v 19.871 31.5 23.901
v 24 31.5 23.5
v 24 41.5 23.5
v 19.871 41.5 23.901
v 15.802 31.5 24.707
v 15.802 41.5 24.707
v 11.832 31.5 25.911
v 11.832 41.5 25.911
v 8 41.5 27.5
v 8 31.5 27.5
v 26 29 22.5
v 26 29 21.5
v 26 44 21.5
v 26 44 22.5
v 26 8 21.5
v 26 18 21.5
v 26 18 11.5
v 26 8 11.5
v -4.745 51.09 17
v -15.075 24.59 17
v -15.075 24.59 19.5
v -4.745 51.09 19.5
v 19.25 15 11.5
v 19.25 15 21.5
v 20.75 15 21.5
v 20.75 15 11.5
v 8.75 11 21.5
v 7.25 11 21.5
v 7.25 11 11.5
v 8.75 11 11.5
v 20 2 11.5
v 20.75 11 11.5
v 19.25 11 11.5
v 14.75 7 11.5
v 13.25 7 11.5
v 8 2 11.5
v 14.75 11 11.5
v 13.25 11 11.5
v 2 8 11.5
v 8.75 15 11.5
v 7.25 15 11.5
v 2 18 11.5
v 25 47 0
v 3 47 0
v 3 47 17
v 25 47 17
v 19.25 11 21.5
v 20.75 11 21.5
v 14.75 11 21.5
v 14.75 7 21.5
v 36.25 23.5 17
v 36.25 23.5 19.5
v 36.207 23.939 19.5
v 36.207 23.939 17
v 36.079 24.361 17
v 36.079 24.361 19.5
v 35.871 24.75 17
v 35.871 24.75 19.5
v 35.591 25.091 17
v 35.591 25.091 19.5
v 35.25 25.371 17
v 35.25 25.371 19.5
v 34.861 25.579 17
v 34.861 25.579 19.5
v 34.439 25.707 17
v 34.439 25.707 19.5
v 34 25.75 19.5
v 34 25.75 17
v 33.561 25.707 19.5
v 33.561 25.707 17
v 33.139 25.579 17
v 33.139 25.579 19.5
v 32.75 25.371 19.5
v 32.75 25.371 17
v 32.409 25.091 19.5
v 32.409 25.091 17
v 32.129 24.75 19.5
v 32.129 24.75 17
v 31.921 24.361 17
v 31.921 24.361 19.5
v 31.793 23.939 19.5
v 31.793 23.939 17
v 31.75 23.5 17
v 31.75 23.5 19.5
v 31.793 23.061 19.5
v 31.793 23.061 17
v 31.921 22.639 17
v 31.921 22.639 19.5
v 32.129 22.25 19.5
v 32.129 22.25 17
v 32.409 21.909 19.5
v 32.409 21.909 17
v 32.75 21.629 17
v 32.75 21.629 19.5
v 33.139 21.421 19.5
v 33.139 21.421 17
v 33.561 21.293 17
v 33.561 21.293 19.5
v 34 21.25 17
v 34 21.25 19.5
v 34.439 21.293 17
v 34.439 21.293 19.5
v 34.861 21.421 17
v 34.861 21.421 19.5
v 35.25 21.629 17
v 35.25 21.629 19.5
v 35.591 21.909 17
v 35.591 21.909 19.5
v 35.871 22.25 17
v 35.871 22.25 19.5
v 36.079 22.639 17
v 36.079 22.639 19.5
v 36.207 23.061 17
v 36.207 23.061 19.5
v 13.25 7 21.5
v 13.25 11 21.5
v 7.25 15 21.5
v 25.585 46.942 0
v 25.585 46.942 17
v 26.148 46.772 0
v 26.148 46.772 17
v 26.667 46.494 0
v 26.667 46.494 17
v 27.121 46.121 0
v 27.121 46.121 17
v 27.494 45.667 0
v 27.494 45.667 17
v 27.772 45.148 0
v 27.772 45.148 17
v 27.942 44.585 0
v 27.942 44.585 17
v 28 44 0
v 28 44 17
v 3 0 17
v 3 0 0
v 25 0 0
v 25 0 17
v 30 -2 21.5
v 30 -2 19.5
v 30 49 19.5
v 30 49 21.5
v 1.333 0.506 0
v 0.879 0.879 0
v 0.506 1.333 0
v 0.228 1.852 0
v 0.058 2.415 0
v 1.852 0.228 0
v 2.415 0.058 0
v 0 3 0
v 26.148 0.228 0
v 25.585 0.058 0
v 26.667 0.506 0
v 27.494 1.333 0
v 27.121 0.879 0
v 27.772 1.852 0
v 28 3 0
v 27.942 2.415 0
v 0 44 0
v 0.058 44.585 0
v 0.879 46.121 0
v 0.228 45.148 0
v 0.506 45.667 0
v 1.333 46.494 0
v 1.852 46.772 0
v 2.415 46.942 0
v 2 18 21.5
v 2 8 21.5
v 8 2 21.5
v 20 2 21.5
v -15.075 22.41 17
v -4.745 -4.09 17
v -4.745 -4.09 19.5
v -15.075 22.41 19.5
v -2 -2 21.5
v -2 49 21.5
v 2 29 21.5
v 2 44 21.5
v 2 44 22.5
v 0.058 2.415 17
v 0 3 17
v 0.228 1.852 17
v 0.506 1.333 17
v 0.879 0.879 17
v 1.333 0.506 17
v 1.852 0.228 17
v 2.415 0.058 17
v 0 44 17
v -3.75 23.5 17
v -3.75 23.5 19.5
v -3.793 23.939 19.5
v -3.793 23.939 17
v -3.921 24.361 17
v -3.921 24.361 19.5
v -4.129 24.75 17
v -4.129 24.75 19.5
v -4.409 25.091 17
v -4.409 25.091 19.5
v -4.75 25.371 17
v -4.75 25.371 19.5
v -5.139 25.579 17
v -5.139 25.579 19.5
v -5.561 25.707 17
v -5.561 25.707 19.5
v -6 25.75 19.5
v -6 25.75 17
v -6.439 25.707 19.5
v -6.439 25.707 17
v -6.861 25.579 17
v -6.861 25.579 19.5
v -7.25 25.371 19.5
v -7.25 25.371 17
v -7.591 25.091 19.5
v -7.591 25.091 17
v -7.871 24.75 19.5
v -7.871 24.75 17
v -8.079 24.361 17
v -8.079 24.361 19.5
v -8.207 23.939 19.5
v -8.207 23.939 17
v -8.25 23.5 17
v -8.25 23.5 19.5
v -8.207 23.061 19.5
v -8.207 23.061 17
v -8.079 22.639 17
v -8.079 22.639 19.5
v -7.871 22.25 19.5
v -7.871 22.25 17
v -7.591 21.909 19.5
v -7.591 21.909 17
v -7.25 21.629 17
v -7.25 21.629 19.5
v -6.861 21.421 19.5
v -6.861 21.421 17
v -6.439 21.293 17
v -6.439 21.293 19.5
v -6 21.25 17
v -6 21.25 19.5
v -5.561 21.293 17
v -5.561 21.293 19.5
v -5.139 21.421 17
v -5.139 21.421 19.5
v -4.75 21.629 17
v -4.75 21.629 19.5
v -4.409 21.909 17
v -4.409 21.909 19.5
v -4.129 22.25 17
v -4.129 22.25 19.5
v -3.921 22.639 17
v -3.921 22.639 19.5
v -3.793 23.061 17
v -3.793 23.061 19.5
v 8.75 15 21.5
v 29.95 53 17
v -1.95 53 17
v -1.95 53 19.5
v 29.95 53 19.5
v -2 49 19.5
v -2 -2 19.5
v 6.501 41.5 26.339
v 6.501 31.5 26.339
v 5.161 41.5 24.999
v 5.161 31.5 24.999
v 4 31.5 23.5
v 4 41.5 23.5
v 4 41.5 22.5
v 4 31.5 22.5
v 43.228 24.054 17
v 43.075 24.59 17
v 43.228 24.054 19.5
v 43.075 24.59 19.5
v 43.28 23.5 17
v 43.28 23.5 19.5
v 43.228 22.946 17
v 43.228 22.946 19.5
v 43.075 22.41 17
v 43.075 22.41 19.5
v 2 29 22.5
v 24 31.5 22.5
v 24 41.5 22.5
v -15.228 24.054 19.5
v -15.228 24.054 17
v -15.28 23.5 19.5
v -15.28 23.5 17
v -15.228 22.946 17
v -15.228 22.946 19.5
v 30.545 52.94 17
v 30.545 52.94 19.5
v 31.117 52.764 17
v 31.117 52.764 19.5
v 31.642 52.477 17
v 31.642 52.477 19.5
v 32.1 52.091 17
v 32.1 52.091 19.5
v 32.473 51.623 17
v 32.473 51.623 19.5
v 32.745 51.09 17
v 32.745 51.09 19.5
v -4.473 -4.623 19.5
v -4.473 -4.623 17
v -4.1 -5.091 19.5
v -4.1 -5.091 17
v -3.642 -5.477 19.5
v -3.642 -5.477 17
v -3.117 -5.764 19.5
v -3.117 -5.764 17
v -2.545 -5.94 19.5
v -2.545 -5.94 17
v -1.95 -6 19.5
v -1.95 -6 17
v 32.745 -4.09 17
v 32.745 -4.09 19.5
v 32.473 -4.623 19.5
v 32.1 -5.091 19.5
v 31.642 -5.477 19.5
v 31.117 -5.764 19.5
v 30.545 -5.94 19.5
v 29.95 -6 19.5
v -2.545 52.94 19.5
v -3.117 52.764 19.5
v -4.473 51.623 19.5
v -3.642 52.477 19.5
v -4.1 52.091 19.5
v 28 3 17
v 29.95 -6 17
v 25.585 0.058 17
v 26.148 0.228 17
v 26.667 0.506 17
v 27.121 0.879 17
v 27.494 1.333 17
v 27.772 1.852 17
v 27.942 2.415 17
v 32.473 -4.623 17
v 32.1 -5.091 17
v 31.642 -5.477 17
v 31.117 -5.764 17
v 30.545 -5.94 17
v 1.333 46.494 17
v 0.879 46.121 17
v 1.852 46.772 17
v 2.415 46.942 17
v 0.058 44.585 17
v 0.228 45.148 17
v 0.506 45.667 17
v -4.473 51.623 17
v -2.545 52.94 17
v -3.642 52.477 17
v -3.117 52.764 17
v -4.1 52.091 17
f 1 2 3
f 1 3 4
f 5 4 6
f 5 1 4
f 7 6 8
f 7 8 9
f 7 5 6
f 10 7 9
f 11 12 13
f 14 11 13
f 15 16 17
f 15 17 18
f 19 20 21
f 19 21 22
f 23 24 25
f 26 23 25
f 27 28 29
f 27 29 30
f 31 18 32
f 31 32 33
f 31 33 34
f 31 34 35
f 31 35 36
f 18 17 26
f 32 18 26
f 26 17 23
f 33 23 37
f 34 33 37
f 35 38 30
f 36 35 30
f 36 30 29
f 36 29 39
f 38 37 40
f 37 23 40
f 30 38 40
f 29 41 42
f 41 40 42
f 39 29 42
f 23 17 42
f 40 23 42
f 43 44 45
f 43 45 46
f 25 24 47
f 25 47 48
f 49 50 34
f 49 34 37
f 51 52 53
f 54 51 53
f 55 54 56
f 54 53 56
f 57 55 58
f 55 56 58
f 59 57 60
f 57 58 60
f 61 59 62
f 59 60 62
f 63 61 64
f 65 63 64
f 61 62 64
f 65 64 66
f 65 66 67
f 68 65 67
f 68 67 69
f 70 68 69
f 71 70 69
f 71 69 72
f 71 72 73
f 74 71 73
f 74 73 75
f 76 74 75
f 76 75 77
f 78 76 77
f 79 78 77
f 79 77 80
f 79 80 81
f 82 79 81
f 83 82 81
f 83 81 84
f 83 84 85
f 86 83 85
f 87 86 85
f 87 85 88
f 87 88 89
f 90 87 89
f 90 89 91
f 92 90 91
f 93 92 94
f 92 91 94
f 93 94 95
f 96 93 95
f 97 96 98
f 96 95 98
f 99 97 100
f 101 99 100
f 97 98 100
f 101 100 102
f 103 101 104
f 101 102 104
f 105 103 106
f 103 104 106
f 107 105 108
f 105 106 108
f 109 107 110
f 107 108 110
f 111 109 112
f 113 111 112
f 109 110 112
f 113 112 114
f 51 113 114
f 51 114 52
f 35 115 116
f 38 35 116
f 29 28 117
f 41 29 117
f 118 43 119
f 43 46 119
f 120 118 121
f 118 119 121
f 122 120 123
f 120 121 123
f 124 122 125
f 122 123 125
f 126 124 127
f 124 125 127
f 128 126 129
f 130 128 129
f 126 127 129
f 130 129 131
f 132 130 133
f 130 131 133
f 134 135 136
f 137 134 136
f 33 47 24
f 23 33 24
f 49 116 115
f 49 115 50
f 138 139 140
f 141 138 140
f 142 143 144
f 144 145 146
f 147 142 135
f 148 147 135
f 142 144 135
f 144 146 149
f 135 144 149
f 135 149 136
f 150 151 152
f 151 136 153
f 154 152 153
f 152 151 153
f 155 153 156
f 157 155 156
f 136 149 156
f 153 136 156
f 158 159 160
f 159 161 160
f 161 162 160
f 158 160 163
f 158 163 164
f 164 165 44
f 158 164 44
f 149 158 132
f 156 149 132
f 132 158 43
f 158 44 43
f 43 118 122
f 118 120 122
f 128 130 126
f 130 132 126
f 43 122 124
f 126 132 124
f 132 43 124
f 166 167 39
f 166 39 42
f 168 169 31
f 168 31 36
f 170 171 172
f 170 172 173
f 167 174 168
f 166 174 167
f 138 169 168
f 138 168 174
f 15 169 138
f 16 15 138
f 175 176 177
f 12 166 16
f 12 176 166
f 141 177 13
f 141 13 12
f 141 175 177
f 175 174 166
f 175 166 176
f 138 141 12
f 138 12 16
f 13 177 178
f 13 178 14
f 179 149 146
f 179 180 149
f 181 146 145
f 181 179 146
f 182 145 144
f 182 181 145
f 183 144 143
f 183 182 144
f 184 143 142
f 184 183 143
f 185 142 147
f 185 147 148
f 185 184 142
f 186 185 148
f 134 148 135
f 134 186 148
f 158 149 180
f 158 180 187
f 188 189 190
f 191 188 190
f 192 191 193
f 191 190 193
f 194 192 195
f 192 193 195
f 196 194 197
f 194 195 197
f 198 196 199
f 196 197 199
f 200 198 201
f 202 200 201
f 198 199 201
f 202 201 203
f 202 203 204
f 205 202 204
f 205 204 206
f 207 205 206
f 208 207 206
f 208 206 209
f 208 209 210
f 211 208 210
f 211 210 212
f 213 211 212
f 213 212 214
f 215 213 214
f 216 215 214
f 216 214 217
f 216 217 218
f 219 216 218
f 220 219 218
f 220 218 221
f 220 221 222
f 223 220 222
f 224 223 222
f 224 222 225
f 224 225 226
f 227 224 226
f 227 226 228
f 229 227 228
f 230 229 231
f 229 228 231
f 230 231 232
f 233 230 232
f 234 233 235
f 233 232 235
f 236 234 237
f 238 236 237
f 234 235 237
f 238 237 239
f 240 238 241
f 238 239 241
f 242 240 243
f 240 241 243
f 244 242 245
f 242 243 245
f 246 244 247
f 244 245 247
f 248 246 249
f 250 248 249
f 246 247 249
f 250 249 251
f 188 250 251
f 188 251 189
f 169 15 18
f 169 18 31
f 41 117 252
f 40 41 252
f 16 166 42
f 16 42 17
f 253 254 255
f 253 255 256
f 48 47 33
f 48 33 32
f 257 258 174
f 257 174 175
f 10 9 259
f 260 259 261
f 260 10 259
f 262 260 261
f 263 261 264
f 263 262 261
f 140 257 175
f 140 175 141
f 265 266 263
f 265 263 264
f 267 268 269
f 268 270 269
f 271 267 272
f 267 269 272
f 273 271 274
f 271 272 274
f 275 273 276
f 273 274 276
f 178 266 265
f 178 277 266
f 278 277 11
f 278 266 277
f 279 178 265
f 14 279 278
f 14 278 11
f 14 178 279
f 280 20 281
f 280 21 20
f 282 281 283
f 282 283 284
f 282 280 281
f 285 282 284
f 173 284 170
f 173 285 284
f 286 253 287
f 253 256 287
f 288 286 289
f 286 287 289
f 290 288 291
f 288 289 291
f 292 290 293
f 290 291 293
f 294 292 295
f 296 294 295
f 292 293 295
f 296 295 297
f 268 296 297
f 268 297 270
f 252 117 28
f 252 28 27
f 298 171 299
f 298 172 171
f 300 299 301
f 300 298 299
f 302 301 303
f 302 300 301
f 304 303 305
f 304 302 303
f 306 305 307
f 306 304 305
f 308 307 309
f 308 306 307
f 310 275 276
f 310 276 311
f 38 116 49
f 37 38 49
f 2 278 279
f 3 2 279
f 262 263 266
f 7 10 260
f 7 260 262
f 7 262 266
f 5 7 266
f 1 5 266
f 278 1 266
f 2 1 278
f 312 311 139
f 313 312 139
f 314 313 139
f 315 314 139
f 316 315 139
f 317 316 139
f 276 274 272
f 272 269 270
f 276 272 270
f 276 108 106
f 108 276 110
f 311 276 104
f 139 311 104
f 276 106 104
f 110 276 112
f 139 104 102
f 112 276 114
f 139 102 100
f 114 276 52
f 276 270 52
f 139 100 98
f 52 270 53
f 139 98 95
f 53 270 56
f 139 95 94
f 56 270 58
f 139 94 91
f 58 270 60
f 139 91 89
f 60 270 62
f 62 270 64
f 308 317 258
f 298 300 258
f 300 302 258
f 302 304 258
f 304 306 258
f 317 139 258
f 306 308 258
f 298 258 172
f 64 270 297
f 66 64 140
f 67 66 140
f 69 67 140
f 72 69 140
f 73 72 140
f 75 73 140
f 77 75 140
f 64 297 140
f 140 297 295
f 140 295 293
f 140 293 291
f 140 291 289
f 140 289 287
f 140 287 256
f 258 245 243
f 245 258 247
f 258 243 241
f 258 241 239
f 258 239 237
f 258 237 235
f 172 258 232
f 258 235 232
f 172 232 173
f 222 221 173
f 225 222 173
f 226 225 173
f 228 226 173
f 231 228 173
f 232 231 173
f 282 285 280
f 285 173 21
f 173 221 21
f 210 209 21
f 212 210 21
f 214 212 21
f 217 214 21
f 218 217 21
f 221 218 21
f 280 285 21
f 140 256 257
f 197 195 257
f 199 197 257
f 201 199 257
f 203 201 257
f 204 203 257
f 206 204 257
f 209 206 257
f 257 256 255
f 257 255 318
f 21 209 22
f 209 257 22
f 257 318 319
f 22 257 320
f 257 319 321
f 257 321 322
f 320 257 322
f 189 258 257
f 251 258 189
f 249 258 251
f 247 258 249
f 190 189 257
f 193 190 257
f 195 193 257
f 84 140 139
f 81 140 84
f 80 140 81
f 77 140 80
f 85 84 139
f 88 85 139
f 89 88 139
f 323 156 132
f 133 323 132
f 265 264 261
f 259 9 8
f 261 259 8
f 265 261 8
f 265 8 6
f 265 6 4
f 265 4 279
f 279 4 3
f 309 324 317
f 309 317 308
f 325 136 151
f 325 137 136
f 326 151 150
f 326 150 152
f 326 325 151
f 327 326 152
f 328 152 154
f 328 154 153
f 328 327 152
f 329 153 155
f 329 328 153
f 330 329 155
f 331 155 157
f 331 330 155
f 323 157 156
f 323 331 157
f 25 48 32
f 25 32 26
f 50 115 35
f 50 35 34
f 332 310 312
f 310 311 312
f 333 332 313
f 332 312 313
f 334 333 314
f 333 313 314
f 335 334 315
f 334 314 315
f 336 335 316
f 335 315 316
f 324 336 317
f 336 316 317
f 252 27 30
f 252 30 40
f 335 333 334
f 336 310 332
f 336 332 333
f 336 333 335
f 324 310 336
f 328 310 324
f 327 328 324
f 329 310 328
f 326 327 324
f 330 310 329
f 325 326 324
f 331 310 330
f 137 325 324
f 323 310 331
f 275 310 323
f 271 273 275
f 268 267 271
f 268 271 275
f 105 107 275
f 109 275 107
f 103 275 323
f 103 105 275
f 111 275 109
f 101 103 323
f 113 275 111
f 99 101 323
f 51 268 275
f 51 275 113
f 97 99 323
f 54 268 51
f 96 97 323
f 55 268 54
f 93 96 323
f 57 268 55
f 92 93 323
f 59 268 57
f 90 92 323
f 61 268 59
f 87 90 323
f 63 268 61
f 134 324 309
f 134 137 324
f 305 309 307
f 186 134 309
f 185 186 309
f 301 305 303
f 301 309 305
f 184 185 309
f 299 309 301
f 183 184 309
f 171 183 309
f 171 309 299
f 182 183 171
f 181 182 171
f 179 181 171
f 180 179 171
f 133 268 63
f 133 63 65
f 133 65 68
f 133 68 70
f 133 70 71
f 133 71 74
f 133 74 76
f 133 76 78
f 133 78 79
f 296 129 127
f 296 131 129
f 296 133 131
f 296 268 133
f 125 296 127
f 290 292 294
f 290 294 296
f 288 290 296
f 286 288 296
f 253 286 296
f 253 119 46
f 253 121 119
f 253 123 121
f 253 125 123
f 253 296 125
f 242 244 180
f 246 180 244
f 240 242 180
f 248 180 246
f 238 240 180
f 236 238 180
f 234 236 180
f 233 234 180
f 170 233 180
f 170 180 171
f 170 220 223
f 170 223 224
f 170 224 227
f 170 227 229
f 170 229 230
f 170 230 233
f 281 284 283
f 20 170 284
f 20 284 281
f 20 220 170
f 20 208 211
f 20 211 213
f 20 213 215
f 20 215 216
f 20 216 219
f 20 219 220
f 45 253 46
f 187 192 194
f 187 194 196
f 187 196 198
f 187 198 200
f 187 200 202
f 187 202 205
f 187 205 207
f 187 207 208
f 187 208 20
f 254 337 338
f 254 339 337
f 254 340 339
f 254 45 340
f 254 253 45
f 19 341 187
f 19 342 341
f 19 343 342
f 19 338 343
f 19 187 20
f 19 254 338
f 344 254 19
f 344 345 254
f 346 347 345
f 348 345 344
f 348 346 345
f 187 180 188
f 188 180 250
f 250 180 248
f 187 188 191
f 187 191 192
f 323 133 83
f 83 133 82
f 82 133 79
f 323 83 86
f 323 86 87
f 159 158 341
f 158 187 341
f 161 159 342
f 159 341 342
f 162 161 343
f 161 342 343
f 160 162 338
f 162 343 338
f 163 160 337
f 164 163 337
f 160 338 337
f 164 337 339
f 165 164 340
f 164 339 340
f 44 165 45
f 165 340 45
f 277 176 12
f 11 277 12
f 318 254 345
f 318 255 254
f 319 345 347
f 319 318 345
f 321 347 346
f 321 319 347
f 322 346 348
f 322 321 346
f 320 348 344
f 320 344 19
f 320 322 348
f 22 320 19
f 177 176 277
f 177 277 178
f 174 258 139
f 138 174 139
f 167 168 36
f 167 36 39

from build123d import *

# Parameters (mm, degrees)
SKETCH_1_W          = 28
SKETCH_1_H          = 47
EXTRUDE_1_DEPTH     = 17
EXTRUDE_2_DEPTH     = 2.5
SKETCH_3_W          = 32
SKETCH_3_H          = 51
EXTRUDE_3_DEPTH     = 2
SKETCH_5_W          = 1.5
SKETCH_5_H          = 4
CUT_EXTRUDE_3_DEPTH = 10
SKETCH_6_W          = 24
SKETCH_6_H          = 15
EXTRUDE_4_DEPTH     = 1
SKETCH_7_W          = 20
SKETCH_7_H          = 10
EXTRUDE_5_DEPTH     = 1
EXTRUDE_6_DEPTH     = 10
SKETCH_9_R          = 2.25
CUT_EXTRUDE_4_DEPTH = 20.5
FILLET_1_R          = 3


with BuildPart() as part:
    # Эскиз1 → Бобышка-Вытянуть1 (new body)
    with BuildSketch(Plane.XY):
        with Locations((14, 23.5)):
            Rectangle(SKETCH_1_W, SKETCH_1_H)
    extrude(amount=EXTRUDE_1_DEPTH)

    # Эскиз2 → Бобышка-Вытянуть2 (add)
    with BuildSketch(Plane.XY.offset(17)):
        Polygon((-4, 53), (32, 53), (43.5, 23.5), (32, -6), (-4, -6), (-15.5, 23.5), align=None)
    extrude(amount=EXTRUDE_2_DEPTH)

    # Эскиз3 → Бобышка-Вытянуть3 (add)
    with BuildSketch(Plane.XY.offset(19.5)):
        with Locations((14, 23.5)):
            Rectangle(SKETCH_3_W, SKETCH_3_H)
    extrude(amount=EXTRUDE_3_DEPTH)

    # Эскиз5 → Вырез-Вытянуть3 (cut)
    with BuildSketch(Plane.XY.offset(21.5)):
        Polygon((2, 18), (26, 18), (26, 8), (20, 2), (8, 2), (2, 8), align=None)
        with Locations((8, 13)):
            Rectangle(SKETCH_5_W, SKETCH_5_H, mode=Mode.SUBTRACT)
        with Locations((14, 9)):
            Rectangle(SKETCH_5_W, SKETCH_5_H, mode=Mode.SUBTRACT)
        with Locations((20, 13)):
            Rectangle(SKETCH_5_W, SKETCH_5_H, mode=Mode.SUBTRACT)
    extrude(amount=-CUT_EXTRUDE_3_DEPTH, mode=Mode.SUBTRACT)

    # Эскиз6 → Бобышка-Вытянуть4 (add)
    with BuildSketch(Plane.XY.offset(21.5)):
        with Locations((14, 36.5)):
            Rectangle(SKETCH_6_W, SKETCH_6_H)
    extrude(amount=EXTRUDE_4_DEPTH)

    # Эскиз7 → Бобышка-Вытянуть5 (add)
    with BuildSketch(Plane.XY.offset(22.5)):
        with Locations((14, 36.5)):
            Rectangle(SKETCH_7_W, SKETCH_7_H)
    extrude(amount=EXTRUDE_5_DEPTH)

    # Эскиз8 → Бобышка-Вытянуть6 (add)
    with BuildSketch(Plane.XZ.offset(-31.5)):
        with BuildLine():
            Line((4, 23.5), (24, 23.5))
            ThreePointArc((24, 23.5), (15.801732114, 24.706928456), (8, 27.5))
            ThreePointArc((8, 27.5), (5.80973161, 25.69026839), (4, 23.5))
        make_face()
    extrude(amount=-EXTRUDE_6_DEPTH)

    # Эскиз9 → Вырез-Вытянуть4 (cut, through all)
    with BuildSketch(Plane.XY.offset(19.5)):
        with Locations((-6, 23.5)):
            Circle(SKETCH_9_R)
        with Locations((34, 23.5)):
            Circle(SKETCH_9_R)
    extrude(amount=-CUT_EXTRUDE_4_DEPTH, mode=Mode.SUBTRACT)

    # Скругление1
    fillet_1_edges = [part.edges().sort_by_distance(p)[0] for p in [
        (43.5, 23.5, 18.25),
        (32, 53, 18.25),
        (-4, 53, 18.25),
        (-15.5, 23.5, 18.25),
        (-4, -6, 18.25),
        (32, -6, 18.25),
        (0, 47, 8.5),
        (28, 47, 8.5),
        (28, 0, 8.5),
        (0, 0, 8.5),
    ]]
    fillet(fillet_1_edges, radius=FILLET_1_R)


solid = part.part
